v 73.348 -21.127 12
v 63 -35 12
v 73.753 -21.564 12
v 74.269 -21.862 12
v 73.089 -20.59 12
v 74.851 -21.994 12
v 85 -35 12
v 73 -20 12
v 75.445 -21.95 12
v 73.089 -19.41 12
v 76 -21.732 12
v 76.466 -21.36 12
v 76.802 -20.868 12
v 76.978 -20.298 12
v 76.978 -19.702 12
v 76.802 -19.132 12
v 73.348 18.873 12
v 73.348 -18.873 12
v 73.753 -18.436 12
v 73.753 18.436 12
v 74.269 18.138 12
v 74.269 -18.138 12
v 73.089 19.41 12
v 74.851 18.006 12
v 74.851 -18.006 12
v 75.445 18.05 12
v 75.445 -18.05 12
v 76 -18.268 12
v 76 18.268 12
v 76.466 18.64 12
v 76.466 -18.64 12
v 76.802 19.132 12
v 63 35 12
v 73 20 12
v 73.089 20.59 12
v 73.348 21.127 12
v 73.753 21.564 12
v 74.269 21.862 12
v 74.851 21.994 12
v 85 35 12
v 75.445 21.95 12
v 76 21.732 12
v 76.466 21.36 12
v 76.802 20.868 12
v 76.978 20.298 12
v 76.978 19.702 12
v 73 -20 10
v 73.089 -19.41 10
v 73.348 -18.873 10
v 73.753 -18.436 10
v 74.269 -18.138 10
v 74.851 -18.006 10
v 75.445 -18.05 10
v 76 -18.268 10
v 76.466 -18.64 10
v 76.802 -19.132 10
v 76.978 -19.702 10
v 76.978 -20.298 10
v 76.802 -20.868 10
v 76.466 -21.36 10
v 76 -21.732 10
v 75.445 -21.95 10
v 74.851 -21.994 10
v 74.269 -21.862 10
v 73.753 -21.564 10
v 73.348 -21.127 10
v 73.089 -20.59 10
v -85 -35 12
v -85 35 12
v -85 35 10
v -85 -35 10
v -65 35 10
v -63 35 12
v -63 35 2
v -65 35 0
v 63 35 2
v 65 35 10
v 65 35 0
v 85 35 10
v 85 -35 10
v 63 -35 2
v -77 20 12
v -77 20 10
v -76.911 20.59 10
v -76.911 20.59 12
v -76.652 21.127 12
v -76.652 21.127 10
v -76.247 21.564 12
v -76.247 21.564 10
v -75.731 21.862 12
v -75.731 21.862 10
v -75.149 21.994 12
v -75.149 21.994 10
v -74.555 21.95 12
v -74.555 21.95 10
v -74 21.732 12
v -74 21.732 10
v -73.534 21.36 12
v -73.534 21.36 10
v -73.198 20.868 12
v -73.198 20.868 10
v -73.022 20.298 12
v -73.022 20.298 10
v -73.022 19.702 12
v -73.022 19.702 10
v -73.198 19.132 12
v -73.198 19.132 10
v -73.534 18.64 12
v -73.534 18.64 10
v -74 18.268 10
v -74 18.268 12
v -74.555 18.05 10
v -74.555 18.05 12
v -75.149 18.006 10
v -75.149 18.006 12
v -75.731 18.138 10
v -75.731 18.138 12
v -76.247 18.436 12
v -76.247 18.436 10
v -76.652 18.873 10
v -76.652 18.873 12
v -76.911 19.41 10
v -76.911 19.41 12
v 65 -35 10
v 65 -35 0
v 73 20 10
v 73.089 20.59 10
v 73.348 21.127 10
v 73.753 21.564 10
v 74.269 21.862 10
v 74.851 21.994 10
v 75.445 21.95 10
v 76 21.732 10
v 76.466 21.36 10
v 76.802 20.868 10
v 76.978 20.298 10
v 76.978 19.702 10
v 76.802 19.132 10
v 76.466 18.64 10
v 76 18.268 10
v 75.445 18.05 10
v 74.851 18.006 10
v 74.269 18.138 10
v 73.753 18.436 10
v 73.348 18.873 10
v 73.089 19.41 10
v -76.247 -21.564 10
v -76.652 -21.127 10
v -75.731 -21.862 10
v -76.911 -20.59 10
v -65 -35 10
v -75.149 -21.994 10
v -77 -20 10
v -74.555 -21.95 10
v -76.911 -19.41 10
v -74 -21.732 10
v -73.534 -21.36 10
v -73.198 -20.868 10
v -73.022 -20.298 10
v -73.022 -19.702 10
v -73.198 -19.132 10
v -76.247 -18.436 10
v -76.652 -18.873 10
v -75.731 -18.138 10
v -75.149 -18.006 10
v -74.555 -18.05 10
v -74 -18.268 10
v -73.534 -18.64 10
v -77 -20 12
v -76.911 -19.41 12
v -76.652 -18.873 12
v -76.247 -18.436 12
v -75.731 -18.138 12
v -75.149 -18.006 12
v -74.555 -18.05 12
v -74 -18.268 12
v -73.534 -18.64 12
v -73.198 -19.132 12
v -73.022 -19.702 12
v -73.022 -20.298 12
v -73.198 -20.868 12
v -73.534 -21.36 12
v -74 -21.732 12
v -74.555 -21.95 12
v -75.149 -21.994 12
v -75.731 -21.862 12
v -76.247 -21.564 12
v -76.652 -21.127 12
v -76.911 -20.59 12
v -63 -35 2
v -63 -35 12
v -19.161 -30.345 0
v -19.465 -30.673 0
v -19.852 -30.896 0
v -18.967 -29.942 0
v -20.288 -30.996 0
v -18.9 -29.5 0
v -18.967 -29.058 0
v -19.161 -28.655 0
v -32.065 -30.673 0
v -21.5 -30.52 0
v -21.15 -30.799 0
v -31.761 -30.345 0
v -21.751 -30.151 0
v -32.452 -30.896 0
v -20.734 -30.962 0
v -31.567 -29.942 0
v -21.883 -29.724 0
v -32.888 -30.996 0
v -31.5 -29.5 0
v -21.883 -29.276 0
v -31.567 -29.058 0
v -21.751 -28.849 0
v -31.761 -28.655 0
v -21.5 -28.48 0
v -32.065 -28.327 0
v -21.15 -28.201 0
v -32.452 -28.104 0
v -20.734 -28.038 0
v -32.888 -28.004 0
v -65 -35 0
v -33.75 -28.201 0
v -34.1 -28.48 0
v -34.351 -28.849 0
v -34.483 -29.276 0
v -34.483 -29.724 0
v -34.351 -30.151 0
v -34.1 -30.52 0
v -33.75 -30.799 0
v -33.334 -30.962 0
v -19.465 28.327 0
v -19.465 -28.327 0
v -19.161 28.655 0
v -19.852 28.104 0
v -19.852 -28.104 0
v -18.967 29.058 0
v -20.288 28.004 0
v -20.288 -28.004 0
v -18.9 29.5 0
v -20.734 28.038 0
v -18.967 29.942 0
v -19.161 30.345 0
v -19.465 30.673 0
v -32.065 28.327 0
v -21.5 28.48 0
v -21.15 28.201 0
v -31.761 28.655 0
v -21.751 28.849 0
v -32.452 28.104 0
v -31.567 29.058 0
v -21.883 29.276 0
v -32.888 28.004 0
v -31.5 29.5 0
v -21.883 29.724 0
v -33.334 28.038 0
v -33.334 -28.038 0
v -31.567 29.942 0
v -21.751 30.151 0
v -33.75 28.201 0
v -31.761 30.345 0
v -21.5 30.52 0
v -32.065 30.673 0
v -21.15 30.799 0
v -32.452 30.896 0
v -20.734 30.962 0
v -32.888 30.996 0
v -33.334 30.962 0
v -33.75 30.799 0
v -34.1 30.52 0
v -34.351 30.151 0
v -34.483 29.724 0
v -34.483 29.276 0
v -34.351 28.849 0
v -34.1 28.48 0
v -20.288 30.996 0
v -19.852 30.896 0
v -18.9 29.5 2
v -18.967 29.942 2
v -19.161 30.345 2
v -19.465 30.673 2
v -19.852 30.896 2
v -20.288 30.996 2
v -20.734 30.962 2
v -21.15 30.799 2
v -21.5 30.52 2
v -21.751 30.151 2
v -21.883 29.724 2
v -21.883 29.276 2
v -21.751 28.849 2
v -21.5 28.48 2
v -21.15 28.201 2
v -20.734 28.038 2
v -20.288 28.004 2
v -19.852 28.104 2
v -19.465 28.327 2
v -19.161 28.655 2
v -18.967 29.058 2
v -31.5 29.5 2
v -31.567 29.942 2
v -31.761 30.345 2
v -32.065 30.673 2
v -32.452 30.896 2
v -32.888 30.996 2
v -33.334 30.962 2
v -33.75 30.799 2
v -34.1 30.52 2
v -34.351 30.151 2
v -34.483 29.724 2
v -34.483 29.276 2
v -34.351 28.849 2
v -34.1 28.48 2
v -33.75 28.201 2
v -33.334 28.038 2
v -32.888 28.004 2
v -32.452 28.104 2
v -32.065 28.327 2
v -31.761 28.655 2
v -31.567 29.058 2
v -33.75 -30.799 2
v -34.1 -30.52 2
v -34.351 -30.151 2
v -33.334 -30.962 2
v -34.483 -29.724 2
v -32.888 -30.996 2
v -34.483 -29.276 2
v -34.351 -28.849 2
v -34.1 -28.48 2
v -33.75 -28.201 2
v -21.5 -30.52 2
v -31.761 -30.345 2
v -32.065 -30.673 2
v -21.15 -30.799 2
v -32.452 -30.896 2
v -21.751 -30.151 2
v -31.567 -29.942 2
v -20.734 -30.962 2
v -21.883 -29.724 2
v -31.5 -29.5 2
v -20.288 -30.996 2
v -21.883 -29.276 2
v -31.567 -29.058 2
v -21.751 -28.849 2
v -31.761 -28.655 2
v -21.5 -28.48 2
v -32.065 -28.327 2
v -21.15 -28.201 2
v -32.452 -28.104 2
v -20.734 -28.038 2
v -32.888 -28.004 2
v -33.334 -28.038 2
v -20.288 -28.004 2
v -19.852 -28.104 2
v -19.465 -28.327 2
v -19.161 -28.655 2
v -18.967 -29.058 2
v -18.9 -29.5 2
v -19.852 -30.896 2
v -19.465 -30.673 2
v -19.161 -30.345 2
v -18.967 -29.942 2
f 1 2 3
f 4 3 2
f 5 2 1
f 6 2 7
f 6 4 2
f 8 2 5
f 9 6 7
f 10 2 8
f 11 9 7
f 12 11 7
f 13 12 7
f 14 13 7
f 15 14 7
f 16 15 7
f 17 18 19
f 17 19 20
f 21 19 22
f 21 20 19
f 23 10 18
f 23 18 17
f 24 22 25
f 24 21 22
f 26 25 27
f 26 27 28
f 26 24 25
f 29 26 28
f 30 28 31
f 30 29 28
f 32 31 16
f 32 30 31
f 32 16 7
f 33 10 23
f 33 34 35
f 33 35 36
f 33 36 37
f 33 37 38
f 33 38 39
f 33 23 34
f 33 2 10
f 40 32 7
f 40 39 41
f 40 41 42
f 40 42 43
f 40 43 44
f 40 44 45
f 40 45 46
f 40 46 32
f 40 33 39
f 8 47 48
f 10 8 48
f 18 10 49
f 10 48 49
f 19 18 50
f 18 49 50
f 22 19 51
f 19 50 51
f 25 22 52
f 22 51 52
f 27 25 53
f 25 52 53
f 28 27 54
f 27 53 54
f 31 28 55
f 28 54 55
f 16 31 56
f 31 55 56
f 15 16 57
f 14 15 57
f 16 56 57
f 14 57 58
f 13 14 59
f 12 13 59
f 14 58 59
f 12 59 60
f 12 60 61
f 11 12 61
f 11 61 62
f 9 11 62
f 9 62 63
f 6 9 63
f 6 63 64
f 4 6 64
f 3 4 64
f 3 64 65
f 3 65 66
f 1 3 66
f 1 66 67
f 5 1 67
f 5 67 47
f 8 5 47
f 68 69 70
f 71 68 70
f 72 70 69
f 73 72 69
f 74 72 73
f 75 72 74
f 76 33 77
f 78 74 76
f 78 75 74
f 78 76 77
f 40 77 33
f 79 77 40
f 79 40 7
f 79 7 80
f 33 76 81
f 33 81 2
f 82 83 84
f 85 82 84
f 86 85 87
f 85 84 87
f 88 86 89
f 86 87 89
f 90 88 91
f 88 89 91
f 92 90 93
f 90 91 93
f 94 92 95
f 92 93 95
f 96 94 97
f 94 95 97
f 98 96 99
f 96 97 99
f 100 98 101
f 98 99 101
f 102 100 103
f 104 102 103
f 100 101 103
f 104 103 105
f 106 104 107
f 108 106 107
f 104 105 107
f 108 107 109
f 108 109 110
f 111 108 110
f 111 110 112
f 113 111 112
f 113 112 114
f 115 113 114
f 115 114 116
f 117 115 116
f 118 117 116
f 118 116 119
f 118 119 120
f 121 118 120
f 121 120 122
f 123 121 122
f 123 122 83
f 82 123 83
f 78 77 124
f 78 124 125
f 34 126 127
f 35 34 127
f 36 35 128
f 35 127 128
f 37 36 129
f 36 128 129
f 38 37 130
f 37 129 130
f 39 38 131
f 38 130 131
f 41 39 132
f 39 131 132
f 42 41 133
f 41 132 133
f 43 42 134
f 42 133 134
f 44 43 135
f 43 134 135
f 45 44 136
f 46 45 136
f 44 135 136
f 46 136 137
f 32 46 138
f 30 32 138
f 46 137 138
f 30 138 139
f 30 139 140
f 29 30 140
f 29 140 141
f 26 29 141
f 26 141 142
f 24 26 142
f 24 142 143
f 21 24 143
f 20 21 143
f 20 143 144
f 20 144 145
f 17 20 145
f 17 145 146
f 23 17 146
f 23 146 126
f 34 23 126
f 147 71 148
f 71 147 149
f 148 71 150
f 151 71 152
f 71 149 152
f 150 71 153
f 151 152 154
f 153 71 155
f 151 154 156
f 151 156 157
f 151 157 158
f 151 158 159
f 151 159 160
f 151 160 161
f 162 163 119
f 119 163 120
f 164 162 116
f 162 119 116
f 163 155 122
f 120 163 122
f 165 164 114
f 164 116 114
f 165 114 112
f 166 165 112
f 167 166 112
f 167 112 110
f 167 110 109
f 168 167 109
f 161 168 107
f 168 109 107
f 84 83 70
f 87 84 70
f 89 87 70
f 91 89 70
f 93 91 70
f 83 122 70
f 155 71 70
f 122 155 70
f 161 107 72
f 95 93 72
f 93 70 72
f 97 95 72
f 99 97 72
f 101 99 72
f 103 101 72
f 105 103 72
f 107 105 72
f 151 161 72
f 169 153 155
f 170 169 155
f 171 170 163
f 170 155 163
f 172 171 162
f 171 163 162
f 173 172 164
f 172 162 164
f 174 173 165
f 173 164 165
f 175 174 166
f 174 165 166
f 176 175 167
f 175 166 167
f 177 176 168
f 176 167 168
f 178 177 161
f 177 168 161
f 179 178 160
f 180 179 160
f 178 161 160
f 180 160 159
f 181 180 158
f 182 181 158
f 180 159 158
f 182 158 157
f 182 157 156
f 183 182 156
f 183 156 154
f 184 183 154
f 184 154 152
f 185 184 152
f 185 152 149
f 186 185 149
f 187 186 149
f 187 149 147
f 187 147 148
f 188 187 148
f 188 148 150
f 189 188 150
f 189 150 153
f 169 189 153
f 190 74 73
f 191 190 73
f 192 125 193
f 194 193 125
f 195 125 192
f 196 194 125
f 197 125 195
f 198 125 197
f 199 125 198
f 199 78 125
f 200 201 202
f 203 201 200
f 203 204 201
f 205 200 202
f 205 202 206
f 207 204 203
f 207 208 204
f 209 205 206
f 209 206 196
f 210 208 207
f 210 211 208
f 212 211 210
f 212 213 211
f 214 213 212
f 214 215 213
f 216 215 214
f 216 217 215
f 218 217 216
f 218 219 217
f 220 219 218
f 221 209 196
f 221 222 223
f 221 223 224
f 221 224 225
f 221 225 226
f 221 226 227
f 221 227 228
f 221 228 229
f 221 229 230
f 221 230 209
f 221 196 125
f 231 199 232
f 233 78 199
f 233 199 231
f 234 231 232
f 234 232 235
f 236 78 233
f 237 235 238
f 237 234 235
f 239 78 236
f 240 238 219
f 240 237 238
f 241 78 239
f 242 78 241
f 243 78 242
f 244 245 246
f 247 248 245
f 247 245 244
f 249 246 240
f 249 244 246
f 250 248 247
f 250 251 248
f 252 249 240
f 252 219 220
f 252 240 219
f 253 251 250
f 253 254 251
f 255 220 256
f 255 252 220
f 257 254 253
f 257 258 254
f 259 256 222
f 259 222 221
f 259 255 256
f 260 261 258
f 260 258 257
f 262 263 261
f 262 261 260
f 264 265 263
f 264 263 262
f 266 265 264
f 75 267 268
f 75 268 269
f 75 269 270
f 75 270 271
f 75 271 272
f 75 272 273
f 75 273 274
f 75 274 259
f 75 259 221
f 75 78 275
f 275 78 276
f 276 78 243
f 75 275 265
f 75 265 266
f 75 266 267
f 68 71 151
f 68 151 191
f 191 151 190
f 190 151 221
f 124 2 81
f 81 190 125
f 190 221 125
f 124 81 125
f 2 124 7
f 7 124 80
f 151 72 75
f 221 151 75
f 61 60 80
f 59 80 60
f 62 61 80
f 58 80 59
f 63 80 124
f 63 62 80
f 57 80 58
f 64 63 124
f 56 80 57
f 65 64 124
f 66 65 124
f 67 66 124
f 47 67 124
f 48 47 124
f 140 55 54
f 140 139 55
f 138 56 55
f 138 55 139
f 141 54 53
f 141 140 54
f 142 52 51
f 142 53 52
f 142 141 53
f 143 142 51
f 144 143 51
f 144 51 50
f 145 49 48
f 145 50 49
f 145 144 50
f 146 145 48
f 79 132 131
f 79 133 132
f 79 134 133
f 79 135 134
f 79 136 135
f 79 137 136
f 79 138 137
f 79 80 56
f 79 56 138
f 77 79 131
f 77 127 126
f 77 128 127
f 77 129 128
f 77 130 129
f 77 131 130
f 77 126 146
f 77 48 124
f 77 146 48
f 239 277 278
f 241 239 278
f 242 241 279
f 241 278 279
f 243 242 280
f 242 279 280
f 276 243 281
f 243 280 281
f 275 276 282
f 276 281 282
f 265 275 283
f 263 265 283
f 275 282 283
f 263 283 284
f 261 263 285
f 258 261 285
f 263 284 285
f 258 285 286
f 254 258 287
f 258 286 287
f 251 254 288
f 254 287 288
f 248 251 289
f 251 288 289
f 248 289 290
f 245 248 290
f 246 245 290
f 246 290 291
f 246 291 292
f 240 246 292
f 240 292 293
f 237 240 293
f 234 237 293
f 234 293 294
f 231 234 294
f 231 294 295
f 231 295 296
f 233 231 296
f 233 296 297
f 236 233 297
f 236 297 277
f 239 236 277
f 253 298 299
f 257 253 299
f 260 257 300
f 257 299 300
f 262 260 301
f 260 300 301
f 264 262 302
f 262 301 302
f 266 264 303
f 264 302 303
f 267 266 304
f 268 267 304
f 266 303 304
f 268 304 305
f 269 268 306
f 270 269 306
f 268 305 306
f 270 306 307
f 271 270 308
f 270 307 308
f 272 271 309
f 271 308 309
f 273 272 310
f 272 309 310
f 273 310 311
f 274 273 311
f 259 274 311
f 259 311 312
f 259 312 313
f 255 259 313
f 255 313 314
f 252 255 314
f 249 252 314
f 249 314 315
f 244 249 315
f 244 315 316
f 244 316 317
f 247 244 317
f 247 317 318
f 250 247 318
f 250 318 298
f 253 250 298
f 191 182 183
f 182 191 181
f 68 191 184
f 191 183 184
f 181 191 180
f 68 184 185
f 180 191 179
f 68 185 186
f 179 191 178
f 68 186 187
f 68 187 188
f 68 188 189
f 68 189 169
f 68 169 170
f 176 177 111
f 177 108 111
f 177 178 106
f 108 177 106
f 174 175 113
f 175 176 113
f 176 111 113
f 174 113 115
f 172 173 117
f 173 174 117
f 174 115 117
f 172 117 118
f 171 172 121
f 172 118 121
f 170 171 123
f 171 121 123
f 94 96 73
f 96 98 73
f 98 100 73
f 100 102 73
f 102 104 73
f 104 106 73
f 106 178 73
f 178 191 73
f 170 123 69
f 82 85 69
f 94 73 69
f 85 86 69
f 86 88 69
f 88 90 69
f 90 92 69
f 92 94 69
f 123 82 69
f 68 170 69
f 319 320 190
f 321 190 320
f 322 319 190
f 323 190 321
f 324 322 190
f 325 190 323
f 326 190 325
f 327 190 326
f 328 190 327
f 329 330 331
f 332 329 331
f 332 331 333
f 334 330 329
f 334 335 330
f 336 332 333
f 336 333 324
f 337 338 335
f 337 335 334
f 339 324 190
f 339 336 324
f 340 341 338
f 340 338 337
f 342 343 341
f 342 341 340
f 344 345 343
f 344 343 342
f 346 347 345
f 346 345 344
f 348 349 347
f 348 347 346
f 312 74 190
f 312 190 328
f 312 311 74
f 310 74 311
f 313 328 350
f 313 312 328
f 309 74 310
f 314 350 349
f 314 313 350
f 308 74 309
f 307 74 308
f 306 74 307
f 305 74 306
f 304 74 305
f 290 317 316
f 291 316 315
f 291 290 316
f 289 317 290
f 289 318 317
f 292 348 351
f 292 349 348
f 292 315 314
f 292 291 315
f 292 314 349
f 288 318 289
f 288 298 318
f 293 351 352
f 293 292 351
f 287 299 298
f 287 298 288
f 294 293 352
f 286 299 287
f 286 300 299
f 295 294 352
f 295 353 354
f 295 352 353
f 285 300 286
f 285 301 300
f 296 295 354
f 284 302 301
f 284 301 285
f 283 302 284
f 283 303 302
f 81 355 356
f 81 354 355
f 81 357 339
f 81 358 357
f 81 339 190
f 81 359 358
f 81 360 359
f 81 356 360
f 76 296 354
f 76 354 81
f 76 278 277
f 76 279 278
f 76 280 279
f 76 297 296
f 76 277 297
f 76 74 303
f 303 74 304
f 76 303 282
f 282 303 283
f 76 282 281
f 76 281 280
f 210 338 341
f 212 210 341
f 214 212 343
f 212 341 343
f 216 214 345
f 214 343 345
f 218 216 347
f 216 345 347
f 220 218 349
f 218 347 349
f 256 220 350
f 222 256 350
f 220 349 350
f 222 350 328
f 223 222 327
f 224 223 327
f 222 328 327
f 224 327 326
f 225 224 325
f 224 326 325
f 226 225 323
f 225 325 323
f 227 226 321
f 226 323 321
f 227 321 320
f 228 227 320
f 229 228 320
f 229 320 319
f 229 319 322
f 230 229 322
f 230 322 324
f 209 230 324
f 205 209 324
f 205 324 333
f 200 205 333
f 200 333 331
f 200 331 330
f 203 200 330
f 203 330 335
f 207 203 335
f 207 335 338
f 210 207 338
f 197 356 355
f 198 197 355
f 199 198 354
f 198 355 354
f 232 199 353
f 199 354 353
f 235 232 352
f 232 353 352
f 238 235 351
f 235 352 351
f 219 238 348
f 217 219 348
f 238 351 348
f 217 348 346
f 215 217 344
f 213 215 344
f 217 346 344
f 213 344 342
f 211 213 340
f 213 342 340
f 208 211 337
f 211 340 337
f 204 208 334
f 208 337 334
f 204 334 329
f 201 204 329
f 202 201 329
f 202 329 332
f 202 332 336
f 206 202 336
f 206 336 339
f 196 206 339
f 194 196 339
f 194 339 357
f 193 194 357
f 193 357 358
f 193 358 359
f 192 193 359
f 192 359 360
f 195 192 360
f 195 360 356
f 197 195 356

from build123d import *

# Parameters (mm, degrees)
SKETCH1_W           = 126
SKETCH1_H           = 70
BOSS_EXTRUDE1_DEPTH = 2
CUT_EXTRUDE1_REACH  = 4
SKETCH2_R           = 1.5
BOSS_EXTRUDE2_DEPTH = 70
CUT_EXTRUDE2_REACH  = 4
SKETCH4_R           = 2


with BuildPart() as part:
    # Sketch1 → Boss-Extrude1 (new body)
    with BuildSketch(Plane.XY):
        Rectangle(SKETCH1_W, SKETCH1_H)
    extrude(amount=BOSS_EXTRUDE1_DEPTH)

    # Sketch2 → Cut-Extrude1 (cut, up to next)
    with BuildSketch(Plane.XY.offset(2), mode=Mode.PRIVATE) as cut_extrude1_sk1:
        with Locations((-20.4, 29.5)):
            Circle(SKETCH2_R)
    cut_extrude1_tool1 = extrude(cut_extrude1_sk1.sketch, amount=-CUT_EXTRUDE1_REACH, mode=Mode.PRIVATE) & part.part
    add(cut_extrude1_tool1.solids().sort_by_distance((-20.4, 29.5, 2))[0], mode=Mode.SUBTRACT)
    # Sketch2 → Cut-Extrude1 (cut, up to next)
    with BuildSketch(Plane.XY.offset(2), mode=Mode.PRIVATE) as cut_extrude1_sk2:
        with Locations((-33, 29.5)):
            Circle(SKETCH2_R)
    cut_extrude1_tool2 = extrude(cut_extrude1_sk2.sketch, amount=-CUT_EXTRUDE1_REACH, mode=Mode.PRIVATE) & part.part
    add(cut_extrude1_tool2.solids().sort_by_distance((-33, 29.5, 2))[0], mode=Mode.SUBTRACT)
    # Sketch2 → Cut-Extrude1 (cut, up to next)
    with BuildSketch(Plane.XY.offset(2), mode=Mode.PRIVATE) as cut_extrude1_sk3:
        with Locations((-20.4, -29.5)):
            Circle(SKETCH2_R)
    cut_extrude1_tool3 = extrude(cut_extrude1_sk3.sketch, amount=-CUT_EXTRUDE1_REACH, mode=Mode.PRIVATE) & part.part
    add(cut_extrude1_tool3.solids().sort_by_distance((-20.4, -29.5, 2))[0], mode=Mode.SUBTRACT)
    # Sketch2 → Cut-Extrude1 (cut, up to next)
    with BuildSketch(Plane.XY.offset(2), mode=Mode.PRIVATE) as cut_extrude1_sk4:
        with Locations((-33, -29.5)):
            Circle(SKETCH2_R)
    cut_extrude1_tool4 = extrude(cut_extrude1_sk4.sketch, amount=-CUT_EXTRUDE1_REACH, mode=Mode.PRIVATE) & part.part
    add(cut_extrude1_tool4.solids().sort_by_distance((-33, -29.5, 2))[0], mode=Mode.SUBTRACT)

    # Sketch3 → Boss-Extrude2 (add)
    with BuildSketch(Plane(origin=(0, 35, 0), x_dir=(1, 0, 0), z_dir=(0, 1, 0))):
        Polygon((-63, 0), (-63, -12), (-85, -12), (-85, -10), (-65, -10), (-65, 0), align=None)
    boss_extrude2 = extrude(amount=-BOSS_EXTRUDE2_DEPTH)

    # Mirror1: Boss-Extrude2 across plane
    add(boss_extrude2.mirror(Plane(origin=(0, 0, 0), x_dir=(0, 0, 1), z_dir=(1, 0, 0))))

    # Sketch4 → Cut-Extrude2 (cut, up to next)
    with BuildSketch(Plane(origin=(0, 0, 10), x_dir=(-1, 0, 0), z_dir=(0, 0, -1)), mode=Mode.PRIVATE) as cut_extrude2_sk1:
        with Locations((-75, 20)):
            Circle(SKETCH4_R)
    cut_extrude2_tool1 = extrude(cut_extrude2_sk1.sketch, amount=-CUT_EXTRUDE2_REACH, mode=Mode.PRIVATE) & part.part
    add(cut_extrude2_tool1.solids().sort_by_distance((75, 20, 10))[0], mode=Mode.SUBTRACT)
    # Sketch4 → Cut-Extrude2 (cut, up to next)
    with BuildSketch(Plane(origin=(0, 0, 10), x_dir=(-1, 0, 0), z_dir=(0, 0, -1)), mode=Mode.PRIVATE) as cut_extrude2_sk2:
        with Locations((-75, -20)):
            Circle(SKETCH4_R)
    cut_extrude2_tool2 = extrude(cut_extrude2_sk2.sketch, amount=-CUT_EXTRUDE2_REACH, mode=Mode.PRIVATE) & part.part
    add(cut_extrude2_tool2.solids().sort_by_distance((75, -20, 10))[0], mode=Mode.SUBTRACT)
    # Sketch4 → Cut-Extrude2 (cut, up to next)
    with BuildSketch(Plane(origin=(0, 0, 10), x_dir=(-1, 0, 0), z_dir=(0, 0, -1)), mode=Mode.PRIVATE) as cut_extrude2_sk3:
        with Locations((75, 20)):
            Circle(SKETCH4_R)
    cut_extrude2_tool3 = extrude(cut_extrude2_sk3.sketch, amount=-CUT_EXTRUDE2_REACH, mode=Mode.PRIVATE) & part.part
    add(cut_extrude2_tool3.solids().sort_by_distance((-75, 20, 10))[0], mode=Mode.SUBTRACT)
    # Sketch4 → Cut-Extrude2 (cut, up to next)
    with BuildSketch(Plane(origin=(0, 0, 10), x_dir=(-1, 0, 0), z_dir=(0, 0, -1)), mode=Mode.PRIVATE) as cut_extrude2_sk4:
        with Locations((75, -20)):
            Circle(SKETCH4_R)
    cut_extrude2_tool4 = extrude(cut_extrude2_sk4.sketch, amount=-CUT_EXTRUDE2_REACH, mode=Mode.PRIVATE) & part.part
    add(cut_extrude2_tool4.solids().sort_by_distance((-75, -20, 10))[0], mode=Mode.SUBTRACT)


solid = part.part
